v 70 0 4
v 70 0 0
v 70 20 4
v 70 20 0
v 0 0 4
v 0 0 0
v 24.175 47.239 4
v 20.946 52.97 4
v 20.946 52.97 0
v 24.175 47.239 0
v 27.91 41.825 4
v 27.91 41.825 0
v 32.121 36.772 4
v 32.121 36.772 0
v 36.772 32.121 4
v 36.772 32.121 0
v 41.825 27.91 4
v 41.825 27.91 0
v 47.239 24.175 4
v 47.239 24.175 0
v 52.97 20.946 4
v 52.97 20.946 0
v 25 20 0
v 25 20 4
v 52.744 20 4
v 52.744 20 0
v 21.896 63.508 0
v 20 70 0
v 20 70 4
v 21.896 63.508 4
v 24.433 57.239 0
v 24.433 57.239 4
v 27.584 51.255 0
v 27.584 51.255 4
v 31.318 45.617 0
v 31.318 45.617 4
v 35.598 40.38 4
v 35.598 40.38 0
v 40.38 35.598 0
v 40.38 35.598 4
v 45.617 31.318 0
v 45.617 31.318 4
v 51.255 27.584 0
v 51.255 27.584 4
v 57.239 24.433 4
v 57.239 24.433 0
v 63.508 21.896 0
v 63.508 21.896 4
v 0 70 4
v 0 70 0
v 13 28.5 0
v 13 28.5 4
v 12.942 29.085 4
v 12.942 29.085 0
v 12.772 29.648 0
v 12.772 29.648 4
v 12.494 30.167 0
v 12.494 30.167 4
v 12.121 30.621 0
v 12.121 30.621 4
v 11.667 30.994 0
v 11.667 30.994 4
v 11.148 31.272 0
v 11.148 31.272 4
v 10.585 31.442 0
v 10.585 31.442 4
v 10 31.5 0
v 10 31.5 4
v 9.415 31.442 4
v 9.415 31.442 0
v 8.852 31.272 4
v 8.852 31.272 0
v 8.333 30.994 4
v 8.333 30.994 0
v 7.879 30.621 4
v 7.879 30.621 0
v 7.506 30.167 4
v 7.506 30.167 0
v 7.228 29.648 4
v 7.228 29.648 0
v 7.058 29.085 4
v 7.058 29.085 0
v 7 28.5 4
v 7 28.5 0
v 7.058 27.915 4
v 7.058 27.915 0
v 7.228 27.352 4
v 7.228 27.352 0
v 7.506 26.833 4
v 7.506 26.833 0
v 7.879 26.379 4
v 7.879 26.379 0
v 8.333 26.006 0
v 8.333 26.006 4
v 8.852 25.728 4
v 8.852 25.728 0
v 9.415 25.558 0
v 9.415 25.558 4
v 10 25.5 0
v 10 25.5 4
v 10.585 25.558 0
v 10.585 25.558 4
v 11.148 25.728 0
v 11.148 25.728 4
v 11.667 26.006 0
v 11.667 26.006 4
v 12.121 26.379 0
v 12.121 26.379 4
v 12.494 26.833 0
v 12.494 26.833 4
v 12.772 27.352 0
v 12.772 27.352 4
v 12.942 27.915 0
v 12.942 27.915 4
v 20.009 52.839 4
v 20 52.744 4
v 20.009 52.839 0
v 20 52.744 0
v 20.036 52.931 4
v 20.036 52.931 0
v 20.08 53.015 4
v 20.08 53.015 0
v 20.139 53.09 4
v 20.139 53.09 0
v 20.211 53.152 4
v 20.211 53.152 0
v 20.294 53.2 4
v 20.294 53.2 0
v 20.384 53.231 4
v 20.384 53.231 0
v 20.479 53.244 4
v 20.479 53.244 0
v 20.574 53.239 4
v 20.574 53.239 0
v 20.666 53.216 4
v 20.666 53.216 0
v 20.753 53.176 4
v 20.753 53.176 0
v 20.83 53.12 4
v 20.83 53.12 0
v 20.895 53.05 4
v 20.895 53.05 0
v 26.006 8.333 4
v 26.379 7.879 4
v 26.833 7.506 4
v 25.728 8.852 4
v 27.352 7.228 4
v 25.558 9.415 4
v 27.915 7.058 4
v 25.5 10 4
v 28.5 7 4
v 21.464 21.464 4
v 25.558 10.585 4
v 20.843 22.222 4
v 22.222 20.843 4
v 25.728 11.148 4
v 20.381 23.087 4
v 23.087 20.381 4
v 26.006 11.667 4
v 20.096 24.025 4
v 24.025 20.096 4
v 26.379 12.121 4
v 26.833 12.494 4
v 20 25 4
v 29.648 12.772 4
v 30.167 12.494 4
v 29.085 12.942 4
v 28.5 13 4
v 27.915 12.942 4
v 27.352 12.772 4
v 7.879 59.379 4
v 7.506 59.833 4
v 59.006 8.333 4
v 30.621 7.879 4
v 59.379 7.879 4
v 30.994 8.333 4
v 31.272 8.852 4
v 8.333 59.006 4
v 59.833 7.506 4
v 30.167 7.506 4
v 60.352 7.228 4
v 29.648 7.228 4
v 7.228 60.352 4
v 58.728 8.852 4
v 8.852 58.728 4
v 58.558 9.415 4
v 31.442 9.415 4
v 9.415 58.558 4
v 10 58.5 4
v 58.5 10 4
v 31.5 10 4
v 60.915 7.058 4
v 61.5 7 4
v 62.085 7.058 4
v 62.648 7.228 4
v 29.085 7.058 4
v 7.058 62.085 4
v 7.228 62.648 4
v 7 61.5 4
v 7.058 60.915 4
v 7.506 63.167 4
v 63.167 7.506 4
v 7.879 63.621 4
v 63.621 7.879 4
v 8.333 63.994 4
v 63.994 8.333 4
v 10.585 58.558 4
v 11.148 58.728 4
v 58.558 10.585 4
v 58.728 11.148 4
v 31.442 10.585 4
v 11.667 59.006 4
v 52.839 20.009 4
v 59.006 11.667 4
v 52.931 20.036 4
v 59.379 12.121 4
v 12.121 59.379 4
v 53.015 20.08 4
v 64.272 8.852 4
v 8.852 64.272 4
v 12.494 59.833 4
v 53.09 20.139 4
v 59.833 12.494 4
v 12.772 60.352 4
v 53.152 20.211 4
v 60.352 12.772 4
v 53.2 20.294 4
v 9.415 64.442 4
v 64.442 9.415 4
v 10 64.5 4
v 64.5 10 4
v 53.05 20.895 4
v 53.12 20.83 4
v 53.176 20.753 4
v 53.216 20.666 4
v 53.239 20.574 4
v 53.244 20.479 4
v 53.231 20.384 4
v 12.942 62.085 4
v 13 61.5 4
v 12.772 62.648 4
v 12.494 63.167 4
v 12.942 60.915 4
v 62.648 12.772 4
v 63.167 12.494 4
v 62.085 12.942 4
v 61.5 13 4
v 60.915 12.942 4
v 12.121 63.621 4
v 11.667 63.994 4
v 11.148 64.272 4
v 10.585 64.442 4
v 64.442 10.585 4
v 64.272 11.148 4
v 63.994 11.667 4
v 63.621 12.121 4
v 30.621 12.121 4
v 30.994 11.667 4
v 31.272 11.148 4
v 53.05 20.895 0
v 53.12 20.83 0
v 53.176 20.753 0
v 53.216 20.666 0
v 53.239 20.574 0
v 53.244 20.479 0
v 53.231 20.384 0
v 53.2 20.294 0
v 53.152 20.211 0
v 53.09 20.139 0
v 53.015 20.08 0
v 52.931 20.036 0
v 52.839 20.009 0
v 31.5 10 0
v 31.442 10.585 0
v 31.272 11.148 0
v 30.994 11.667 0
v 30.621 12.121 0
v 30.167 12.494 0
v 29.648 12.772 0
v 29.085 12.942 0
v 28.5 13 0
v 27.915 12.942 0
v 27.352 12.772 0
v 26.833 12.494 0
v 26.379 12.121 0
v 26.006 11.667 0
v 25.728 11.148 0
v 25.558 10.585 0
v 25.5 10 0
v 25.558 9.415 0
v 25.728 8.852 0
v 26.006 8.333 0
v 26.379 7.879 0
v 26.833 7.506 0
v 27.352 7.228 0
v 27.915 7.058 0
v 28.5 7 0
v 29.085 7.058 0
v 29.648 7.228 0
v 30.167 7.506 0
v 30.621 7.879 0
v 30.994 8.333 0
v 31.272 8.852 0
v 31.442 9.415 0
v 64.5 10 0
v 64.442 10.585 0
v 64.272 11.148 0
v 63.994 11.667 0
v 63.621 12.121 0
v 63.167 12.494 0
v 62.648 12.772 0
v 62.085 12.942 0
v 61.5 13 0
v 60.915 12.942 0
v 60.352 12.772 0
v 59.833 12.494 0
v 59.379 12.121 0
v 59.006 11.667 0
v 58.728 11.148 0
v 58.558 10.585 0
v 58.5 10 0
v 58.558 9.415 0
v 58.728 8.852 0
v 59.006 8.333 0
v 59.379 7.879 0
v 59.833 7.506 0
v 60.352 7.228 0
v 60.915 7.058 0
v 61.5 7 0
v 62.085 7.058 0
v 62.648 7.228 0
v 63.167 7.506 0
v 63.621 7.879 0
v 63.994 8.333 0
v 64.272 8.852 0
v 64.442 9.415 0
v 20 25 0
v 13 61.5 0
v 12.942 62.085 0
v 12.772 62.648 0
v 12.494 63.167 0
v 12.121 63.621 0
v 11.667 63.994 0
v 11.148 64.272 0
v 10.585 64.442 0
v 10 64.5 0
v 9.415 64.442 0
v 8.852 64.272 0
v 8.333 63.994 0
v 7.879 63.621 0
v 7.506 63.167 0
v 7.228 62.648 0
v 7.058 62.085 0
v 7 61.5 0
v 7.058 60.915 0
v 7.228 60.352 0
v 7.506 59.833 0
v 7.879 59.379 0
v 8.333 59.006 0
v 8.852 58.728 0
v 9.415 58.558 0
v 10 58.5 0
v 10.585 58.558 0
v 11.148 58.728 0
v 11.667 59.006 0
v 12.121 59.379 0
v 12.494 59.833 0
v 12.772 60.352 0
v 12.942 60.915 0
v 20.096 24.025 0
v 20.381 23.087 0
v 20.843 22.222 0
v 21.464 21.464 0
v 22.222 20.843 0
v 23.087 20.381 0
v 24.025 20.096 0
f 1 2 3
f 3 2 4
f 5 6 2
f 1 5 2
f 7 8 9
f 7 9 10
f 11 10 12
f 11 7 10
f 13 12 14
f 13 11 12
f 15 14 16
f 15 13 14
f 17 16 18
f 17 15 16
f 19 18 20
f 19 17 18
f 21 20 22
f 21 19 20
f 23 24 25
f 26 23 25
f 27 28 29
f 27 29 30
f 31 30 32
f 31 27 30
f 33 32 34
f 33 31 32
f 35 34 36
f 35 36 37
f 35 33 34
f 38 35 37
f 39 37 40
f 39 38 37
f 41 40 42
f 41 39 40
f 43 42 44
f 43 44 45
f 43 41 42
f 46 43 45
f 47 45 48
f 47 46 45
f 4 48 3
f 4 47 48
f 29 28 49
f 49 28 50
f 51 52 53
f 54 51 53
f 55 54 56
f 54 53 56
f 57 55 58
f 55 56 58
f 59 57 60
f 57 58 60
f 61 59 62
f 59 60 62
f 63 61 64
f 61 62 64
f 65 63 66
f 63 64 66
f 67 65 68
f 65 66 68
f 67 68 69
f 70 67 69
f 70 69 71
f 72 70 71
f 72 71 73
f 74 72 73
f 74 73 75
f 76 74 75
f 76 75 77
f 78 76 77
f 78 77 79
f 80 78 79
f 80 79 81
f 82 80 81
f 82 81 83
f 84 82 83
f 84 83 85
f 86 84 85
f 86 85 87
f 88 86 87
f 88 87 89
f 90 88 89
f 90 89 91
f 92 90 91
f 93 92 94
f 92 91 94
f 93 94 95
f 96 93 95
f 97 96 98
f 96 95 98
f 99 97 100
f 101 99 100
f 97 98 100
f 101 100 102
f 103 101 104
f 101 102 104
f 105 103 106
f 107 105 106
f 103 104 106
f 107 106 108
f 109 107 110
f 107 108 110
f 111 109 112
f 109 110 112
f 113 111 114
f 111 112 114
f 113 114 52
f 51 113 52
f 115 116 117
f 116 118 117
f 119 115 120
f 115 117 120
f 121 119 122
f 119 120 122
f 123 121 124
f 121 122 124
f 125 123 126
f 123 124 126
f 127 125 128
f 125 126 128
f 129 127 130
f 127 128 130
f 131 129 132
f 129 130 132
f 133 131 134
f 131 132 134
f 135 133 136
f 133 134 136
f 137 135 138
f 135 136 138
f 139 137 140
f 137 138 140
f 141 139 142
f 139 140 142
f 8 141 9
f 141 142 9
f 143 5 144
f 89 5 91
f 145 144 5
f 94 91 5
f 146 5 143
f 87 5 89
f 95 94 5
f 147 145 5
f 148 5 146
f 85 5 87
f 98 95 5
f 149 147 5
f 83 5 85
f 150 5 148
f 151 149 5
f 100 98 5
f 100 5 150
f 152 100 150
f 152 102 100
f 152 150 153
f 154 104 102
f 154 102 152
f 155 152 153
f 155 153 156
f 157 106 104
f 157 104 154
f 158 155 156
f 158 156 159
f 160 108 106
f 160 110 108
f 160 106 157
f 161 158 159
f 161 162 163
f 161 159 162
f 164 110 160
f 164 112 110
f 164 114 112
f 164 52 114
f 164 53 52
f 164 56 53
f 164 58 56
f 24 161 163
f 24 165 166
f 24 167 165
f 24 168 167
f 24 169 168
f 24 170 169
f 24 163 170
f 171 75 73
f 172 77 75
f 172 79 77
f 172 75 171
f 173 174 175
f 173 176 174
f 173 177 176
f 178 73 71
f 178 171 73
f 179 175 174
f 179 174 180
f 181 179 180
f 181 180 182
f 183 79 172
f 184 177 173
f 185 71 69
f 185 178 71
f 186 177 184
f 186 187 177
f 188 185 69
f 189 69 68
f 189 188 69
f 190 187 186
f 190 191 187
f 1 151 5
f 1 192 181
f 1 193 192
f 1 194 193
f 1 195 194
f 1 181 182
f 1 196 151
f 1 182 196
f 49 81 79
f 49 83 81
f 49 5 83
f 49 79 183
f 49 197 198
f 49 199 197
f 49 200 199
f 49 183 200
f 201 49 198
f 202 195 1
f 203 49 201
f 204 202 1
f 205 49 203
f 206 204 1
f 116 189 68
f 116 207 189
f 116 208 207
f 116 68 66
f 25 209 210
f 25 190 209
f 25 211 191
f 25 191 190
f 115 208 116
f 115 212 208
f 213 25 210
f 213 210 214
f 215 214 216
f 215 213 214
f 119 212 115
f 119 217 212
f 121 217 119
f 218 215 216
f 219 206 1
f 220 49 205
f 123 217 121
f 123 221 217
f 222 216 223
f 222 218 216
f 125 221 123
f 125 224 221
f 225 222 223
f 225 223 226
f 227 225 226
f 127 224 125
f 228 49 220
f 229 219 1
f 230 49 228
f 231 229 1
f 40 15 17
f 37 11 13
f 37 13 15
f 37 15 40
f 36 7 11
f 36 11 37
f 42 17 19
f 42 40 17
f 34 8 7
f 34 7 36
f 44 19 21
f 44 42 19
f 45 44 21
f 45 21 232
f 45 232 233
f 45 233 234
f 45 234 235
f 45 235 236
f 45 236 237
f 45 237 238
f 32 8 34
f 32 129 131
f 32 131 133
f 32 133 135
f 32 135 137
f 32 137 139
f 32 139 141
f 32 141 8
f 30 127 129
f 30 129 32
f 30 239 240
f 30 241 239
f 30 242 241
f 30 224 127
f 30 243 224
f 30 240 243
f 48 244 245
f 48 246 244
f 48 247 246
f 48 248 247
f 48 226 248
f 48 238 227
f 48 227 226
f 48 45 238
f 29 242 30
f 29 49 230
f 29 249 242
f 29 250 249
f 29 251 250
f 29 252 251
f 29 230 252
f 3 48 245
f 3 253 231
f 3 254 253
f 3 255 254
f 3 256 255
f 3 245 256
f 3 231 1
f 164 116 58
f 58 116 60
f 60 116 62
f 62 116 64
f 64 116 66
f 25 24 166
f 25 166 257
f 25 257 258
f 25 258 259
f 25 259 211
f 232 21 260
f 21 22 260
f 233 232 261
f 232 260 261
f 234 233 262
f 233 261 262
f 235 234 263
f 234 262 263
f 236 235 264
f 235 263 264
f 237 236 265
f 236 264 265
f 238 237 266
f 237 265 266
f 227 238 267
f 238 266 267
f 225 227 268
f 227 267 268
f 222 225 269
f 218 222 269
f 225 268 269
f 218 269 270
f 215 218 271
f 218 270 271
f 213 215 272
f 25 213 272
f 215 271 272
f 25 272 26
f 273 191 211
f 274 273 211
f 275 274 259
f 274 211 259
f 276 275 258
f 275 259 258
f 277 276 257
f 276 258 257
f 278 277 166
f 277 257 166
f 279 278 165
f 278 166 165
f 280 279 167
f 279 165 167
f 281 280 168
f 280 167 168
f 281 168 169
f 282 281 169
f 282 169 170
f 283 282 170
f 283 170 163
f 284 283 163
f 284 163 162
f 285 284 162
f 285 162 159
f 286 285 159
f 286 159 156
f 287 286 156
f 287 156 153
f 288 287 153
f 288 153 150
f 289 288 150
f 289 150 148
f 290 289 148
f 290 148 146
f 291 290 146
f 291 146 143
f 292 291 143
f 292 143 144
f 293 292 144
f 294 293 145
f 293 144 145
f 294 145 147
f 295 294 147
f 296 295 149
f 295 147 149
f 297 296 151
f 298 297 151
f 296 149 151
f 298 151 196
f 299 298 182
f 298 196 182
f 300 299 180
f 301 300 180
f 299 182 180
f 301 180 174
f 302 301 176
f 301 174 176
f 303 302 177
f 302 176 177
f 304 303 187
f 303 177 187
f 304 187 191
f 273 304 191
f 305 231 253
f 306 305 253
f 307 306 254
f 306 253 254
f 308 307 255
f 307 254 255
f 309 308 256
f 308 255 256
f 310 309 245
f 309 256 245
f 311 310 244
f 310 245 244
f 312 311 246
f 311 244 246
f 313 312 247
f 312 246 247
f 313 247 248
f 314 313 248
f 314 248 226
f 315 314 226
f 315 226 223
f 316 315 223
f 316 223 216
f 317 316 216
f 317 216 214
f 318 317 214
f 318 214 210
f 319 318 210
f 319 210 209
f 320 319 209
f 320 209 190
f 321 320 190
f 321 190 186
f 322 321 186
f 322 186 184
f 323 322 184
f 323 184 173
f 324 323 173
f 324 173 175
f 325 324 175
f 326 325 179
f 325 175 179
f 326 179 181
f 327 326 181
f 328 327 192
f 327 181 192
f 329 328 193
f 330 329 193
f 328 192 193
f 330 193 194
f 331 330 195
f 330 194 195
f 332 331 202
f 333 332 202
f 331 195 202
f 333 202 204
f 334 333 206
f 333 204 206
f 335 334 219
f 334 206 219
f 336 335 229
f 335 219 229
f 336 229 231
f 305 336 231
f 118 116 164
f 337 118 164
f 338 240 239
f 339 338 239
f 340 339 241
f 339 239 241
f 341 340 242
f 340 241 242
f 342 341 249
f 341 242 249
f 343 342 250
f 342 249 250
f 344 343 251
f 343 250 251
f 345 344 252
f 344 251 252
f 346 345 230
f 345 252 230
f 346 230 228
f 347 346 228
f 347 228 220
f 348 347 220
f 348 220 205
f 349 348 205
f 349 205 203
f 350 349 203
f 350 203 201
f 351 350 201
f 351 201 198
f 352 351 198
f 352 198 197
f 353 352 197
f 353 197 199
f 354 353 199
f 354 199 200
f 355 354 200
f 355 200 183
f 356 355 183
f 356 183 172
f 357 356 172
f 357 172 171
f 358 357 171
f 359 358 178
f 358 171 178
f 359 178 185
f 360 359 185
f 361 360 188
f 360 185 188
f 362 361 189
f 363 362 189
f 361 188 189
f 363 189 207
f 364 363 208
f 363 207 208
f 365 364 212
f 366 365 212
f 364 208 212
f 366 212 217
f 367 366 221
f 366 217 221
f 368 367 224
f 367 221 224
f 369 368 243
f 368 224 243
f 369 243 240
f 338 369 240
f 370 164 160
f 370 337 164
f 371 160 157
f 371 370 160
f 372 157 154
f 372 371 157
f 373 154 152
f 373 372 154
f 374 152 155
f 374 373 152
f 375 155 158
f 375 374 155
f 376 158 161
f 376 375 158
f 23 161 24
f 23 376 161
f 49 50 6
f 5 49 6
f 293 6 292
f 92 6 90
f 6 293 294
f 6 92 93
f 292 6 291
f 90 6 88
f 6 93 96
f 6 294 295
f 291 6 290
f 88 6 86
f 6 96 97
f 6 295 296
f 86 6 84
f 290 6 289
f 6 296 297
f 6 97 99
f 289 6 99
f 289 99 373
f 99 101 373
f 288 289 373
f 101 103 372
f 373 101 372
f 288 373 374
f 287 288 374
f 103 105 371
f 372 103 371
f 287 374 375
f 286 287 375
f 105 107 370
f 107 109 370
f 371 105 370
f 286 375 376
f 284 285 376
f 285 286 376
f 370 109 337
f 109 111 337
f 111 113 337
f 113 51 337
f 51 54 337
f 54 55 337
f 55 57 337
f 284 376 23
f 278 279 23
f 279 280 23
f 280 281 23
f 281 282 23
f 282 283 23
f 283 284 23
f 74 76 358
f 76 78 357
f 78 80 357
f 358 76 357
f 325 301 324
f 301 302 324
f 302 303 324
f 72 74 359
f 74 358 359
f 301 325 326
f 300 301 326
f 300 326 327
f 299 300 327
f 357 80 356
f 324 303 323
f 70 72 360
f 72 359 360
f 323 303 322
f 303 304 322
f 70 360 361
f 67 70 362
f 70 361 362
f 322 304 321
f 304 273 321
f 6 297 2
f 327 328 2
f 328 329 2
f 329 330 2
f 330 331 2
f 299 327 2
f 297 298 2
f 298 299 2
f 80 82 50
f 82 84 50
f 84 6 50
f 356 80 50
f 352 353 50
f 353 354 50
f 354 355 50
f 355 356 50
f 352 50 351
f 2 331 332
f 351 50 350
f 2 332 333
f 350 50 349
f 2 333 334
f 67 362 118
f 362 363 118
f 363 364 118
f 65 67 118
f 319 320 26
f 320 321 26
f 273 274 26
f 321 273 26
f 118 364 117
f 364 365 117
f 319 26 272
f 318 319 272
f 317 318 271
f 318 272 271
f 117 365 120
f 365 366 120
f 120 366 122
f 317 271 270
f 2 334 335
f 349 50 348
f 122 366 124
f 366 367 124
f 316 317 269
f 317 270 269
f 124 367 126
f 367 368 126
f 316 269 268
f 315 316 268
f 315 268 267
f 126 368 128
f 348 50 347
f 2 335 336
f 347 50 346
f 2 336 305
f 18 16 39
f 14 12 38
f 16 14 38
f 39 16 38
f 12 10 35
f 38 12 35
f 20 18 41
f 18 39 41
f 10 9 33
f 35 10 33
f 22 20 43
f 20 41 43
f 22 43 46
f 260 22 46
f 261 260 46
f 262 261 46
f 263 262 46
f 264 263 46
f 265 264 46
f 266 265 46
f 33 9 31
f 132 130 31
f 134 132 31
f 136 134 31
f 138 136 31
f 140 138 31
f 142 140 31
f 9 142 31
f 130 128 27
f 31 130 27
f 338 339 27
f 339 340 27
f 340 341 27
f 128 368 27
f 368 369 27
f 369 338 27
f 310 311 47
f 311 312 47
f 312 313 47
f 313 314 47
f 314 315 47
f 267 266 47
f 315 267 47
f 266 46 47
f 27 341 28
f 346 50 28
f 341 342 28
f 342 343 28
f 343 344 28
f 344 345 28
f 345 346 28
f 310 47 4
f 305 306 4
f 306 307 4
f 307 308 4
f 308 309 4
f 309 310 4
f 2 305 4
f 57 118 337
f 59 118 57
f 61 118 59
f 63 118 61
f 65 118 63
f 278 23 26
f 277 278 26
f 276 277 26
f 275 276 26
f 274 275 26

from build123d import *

# Parameters (mm, degrees)
PAD_DEPTH       = 4
POCKET_DEPTH    = 4.001
SKETCH002_R     = 3
POCKET001_DEPTH = 4.001
FILLET_R        = 5
FILLET001_R     = 0.5


with BuildPart() as part:
    # Sketch → Pad (new body)
    with BuildSketch(Plane.XY):
        with BuildLine():
            Line((0, 0), (70, 0))
            Line((70, 0), (70, 20))
            ThreePointArc((20, 70), (37.928932, 37.928932), (70, 20))
            Line((20, 70), (0, 70))
            Line((0, 70), (0, 0))
        make_face()
    extrude(amount=PAD_DEPTH)

    # Sketch001 → Pocket (cut, through all)
    with BuildSketch(Plane.XY.offset(4)):
        with BuildLine():
            ThreePointArc((20, 54.914649), (34.393398, 34.393398), (54.914649, 20))
            Line((20, 20), (54.914649, 20))
            Line((20, 54.914649), (20, 20))
        make_face()
    extrude(amount=-POCKET_DEPTH, mode=Mode.SUBTRACT)

    # Sketch002 → Pocket001 (cut, through all)
    with BuildSketch(Plane.XY.offset(4)):
        with Locations((10, 28.5)):
            Circle(SKETCH002_R)
        with Locations((10, 61.5)):
            Circle(SKETCH002_R)
        with Locations((28.5, 10)):
            Circle(SKETCH002_R)
        with Locations((61.5, 10)):
            Circle(SKETCH002_R)
    extrude(amount=-POCKET001_DEPTH, mode=Mode.SUBTRACT)

    # Fillet
    fillet_edges = [part.edges().sort_by_distance(p)[0] for p in [
        (20, 20, 2),
    ]]
    fillet(fillet_edges, radius=FILLET_R)

    # Fillet001
    fillet001_edges = [part.edges().sort_by_distance(p)[0] for p in [
        (20, 54.914649, 2),
        (54.914649, 20, 2),
    ]]
    fillet(fillet001_edges, radius=FILLET001_R)


solid = part.part
